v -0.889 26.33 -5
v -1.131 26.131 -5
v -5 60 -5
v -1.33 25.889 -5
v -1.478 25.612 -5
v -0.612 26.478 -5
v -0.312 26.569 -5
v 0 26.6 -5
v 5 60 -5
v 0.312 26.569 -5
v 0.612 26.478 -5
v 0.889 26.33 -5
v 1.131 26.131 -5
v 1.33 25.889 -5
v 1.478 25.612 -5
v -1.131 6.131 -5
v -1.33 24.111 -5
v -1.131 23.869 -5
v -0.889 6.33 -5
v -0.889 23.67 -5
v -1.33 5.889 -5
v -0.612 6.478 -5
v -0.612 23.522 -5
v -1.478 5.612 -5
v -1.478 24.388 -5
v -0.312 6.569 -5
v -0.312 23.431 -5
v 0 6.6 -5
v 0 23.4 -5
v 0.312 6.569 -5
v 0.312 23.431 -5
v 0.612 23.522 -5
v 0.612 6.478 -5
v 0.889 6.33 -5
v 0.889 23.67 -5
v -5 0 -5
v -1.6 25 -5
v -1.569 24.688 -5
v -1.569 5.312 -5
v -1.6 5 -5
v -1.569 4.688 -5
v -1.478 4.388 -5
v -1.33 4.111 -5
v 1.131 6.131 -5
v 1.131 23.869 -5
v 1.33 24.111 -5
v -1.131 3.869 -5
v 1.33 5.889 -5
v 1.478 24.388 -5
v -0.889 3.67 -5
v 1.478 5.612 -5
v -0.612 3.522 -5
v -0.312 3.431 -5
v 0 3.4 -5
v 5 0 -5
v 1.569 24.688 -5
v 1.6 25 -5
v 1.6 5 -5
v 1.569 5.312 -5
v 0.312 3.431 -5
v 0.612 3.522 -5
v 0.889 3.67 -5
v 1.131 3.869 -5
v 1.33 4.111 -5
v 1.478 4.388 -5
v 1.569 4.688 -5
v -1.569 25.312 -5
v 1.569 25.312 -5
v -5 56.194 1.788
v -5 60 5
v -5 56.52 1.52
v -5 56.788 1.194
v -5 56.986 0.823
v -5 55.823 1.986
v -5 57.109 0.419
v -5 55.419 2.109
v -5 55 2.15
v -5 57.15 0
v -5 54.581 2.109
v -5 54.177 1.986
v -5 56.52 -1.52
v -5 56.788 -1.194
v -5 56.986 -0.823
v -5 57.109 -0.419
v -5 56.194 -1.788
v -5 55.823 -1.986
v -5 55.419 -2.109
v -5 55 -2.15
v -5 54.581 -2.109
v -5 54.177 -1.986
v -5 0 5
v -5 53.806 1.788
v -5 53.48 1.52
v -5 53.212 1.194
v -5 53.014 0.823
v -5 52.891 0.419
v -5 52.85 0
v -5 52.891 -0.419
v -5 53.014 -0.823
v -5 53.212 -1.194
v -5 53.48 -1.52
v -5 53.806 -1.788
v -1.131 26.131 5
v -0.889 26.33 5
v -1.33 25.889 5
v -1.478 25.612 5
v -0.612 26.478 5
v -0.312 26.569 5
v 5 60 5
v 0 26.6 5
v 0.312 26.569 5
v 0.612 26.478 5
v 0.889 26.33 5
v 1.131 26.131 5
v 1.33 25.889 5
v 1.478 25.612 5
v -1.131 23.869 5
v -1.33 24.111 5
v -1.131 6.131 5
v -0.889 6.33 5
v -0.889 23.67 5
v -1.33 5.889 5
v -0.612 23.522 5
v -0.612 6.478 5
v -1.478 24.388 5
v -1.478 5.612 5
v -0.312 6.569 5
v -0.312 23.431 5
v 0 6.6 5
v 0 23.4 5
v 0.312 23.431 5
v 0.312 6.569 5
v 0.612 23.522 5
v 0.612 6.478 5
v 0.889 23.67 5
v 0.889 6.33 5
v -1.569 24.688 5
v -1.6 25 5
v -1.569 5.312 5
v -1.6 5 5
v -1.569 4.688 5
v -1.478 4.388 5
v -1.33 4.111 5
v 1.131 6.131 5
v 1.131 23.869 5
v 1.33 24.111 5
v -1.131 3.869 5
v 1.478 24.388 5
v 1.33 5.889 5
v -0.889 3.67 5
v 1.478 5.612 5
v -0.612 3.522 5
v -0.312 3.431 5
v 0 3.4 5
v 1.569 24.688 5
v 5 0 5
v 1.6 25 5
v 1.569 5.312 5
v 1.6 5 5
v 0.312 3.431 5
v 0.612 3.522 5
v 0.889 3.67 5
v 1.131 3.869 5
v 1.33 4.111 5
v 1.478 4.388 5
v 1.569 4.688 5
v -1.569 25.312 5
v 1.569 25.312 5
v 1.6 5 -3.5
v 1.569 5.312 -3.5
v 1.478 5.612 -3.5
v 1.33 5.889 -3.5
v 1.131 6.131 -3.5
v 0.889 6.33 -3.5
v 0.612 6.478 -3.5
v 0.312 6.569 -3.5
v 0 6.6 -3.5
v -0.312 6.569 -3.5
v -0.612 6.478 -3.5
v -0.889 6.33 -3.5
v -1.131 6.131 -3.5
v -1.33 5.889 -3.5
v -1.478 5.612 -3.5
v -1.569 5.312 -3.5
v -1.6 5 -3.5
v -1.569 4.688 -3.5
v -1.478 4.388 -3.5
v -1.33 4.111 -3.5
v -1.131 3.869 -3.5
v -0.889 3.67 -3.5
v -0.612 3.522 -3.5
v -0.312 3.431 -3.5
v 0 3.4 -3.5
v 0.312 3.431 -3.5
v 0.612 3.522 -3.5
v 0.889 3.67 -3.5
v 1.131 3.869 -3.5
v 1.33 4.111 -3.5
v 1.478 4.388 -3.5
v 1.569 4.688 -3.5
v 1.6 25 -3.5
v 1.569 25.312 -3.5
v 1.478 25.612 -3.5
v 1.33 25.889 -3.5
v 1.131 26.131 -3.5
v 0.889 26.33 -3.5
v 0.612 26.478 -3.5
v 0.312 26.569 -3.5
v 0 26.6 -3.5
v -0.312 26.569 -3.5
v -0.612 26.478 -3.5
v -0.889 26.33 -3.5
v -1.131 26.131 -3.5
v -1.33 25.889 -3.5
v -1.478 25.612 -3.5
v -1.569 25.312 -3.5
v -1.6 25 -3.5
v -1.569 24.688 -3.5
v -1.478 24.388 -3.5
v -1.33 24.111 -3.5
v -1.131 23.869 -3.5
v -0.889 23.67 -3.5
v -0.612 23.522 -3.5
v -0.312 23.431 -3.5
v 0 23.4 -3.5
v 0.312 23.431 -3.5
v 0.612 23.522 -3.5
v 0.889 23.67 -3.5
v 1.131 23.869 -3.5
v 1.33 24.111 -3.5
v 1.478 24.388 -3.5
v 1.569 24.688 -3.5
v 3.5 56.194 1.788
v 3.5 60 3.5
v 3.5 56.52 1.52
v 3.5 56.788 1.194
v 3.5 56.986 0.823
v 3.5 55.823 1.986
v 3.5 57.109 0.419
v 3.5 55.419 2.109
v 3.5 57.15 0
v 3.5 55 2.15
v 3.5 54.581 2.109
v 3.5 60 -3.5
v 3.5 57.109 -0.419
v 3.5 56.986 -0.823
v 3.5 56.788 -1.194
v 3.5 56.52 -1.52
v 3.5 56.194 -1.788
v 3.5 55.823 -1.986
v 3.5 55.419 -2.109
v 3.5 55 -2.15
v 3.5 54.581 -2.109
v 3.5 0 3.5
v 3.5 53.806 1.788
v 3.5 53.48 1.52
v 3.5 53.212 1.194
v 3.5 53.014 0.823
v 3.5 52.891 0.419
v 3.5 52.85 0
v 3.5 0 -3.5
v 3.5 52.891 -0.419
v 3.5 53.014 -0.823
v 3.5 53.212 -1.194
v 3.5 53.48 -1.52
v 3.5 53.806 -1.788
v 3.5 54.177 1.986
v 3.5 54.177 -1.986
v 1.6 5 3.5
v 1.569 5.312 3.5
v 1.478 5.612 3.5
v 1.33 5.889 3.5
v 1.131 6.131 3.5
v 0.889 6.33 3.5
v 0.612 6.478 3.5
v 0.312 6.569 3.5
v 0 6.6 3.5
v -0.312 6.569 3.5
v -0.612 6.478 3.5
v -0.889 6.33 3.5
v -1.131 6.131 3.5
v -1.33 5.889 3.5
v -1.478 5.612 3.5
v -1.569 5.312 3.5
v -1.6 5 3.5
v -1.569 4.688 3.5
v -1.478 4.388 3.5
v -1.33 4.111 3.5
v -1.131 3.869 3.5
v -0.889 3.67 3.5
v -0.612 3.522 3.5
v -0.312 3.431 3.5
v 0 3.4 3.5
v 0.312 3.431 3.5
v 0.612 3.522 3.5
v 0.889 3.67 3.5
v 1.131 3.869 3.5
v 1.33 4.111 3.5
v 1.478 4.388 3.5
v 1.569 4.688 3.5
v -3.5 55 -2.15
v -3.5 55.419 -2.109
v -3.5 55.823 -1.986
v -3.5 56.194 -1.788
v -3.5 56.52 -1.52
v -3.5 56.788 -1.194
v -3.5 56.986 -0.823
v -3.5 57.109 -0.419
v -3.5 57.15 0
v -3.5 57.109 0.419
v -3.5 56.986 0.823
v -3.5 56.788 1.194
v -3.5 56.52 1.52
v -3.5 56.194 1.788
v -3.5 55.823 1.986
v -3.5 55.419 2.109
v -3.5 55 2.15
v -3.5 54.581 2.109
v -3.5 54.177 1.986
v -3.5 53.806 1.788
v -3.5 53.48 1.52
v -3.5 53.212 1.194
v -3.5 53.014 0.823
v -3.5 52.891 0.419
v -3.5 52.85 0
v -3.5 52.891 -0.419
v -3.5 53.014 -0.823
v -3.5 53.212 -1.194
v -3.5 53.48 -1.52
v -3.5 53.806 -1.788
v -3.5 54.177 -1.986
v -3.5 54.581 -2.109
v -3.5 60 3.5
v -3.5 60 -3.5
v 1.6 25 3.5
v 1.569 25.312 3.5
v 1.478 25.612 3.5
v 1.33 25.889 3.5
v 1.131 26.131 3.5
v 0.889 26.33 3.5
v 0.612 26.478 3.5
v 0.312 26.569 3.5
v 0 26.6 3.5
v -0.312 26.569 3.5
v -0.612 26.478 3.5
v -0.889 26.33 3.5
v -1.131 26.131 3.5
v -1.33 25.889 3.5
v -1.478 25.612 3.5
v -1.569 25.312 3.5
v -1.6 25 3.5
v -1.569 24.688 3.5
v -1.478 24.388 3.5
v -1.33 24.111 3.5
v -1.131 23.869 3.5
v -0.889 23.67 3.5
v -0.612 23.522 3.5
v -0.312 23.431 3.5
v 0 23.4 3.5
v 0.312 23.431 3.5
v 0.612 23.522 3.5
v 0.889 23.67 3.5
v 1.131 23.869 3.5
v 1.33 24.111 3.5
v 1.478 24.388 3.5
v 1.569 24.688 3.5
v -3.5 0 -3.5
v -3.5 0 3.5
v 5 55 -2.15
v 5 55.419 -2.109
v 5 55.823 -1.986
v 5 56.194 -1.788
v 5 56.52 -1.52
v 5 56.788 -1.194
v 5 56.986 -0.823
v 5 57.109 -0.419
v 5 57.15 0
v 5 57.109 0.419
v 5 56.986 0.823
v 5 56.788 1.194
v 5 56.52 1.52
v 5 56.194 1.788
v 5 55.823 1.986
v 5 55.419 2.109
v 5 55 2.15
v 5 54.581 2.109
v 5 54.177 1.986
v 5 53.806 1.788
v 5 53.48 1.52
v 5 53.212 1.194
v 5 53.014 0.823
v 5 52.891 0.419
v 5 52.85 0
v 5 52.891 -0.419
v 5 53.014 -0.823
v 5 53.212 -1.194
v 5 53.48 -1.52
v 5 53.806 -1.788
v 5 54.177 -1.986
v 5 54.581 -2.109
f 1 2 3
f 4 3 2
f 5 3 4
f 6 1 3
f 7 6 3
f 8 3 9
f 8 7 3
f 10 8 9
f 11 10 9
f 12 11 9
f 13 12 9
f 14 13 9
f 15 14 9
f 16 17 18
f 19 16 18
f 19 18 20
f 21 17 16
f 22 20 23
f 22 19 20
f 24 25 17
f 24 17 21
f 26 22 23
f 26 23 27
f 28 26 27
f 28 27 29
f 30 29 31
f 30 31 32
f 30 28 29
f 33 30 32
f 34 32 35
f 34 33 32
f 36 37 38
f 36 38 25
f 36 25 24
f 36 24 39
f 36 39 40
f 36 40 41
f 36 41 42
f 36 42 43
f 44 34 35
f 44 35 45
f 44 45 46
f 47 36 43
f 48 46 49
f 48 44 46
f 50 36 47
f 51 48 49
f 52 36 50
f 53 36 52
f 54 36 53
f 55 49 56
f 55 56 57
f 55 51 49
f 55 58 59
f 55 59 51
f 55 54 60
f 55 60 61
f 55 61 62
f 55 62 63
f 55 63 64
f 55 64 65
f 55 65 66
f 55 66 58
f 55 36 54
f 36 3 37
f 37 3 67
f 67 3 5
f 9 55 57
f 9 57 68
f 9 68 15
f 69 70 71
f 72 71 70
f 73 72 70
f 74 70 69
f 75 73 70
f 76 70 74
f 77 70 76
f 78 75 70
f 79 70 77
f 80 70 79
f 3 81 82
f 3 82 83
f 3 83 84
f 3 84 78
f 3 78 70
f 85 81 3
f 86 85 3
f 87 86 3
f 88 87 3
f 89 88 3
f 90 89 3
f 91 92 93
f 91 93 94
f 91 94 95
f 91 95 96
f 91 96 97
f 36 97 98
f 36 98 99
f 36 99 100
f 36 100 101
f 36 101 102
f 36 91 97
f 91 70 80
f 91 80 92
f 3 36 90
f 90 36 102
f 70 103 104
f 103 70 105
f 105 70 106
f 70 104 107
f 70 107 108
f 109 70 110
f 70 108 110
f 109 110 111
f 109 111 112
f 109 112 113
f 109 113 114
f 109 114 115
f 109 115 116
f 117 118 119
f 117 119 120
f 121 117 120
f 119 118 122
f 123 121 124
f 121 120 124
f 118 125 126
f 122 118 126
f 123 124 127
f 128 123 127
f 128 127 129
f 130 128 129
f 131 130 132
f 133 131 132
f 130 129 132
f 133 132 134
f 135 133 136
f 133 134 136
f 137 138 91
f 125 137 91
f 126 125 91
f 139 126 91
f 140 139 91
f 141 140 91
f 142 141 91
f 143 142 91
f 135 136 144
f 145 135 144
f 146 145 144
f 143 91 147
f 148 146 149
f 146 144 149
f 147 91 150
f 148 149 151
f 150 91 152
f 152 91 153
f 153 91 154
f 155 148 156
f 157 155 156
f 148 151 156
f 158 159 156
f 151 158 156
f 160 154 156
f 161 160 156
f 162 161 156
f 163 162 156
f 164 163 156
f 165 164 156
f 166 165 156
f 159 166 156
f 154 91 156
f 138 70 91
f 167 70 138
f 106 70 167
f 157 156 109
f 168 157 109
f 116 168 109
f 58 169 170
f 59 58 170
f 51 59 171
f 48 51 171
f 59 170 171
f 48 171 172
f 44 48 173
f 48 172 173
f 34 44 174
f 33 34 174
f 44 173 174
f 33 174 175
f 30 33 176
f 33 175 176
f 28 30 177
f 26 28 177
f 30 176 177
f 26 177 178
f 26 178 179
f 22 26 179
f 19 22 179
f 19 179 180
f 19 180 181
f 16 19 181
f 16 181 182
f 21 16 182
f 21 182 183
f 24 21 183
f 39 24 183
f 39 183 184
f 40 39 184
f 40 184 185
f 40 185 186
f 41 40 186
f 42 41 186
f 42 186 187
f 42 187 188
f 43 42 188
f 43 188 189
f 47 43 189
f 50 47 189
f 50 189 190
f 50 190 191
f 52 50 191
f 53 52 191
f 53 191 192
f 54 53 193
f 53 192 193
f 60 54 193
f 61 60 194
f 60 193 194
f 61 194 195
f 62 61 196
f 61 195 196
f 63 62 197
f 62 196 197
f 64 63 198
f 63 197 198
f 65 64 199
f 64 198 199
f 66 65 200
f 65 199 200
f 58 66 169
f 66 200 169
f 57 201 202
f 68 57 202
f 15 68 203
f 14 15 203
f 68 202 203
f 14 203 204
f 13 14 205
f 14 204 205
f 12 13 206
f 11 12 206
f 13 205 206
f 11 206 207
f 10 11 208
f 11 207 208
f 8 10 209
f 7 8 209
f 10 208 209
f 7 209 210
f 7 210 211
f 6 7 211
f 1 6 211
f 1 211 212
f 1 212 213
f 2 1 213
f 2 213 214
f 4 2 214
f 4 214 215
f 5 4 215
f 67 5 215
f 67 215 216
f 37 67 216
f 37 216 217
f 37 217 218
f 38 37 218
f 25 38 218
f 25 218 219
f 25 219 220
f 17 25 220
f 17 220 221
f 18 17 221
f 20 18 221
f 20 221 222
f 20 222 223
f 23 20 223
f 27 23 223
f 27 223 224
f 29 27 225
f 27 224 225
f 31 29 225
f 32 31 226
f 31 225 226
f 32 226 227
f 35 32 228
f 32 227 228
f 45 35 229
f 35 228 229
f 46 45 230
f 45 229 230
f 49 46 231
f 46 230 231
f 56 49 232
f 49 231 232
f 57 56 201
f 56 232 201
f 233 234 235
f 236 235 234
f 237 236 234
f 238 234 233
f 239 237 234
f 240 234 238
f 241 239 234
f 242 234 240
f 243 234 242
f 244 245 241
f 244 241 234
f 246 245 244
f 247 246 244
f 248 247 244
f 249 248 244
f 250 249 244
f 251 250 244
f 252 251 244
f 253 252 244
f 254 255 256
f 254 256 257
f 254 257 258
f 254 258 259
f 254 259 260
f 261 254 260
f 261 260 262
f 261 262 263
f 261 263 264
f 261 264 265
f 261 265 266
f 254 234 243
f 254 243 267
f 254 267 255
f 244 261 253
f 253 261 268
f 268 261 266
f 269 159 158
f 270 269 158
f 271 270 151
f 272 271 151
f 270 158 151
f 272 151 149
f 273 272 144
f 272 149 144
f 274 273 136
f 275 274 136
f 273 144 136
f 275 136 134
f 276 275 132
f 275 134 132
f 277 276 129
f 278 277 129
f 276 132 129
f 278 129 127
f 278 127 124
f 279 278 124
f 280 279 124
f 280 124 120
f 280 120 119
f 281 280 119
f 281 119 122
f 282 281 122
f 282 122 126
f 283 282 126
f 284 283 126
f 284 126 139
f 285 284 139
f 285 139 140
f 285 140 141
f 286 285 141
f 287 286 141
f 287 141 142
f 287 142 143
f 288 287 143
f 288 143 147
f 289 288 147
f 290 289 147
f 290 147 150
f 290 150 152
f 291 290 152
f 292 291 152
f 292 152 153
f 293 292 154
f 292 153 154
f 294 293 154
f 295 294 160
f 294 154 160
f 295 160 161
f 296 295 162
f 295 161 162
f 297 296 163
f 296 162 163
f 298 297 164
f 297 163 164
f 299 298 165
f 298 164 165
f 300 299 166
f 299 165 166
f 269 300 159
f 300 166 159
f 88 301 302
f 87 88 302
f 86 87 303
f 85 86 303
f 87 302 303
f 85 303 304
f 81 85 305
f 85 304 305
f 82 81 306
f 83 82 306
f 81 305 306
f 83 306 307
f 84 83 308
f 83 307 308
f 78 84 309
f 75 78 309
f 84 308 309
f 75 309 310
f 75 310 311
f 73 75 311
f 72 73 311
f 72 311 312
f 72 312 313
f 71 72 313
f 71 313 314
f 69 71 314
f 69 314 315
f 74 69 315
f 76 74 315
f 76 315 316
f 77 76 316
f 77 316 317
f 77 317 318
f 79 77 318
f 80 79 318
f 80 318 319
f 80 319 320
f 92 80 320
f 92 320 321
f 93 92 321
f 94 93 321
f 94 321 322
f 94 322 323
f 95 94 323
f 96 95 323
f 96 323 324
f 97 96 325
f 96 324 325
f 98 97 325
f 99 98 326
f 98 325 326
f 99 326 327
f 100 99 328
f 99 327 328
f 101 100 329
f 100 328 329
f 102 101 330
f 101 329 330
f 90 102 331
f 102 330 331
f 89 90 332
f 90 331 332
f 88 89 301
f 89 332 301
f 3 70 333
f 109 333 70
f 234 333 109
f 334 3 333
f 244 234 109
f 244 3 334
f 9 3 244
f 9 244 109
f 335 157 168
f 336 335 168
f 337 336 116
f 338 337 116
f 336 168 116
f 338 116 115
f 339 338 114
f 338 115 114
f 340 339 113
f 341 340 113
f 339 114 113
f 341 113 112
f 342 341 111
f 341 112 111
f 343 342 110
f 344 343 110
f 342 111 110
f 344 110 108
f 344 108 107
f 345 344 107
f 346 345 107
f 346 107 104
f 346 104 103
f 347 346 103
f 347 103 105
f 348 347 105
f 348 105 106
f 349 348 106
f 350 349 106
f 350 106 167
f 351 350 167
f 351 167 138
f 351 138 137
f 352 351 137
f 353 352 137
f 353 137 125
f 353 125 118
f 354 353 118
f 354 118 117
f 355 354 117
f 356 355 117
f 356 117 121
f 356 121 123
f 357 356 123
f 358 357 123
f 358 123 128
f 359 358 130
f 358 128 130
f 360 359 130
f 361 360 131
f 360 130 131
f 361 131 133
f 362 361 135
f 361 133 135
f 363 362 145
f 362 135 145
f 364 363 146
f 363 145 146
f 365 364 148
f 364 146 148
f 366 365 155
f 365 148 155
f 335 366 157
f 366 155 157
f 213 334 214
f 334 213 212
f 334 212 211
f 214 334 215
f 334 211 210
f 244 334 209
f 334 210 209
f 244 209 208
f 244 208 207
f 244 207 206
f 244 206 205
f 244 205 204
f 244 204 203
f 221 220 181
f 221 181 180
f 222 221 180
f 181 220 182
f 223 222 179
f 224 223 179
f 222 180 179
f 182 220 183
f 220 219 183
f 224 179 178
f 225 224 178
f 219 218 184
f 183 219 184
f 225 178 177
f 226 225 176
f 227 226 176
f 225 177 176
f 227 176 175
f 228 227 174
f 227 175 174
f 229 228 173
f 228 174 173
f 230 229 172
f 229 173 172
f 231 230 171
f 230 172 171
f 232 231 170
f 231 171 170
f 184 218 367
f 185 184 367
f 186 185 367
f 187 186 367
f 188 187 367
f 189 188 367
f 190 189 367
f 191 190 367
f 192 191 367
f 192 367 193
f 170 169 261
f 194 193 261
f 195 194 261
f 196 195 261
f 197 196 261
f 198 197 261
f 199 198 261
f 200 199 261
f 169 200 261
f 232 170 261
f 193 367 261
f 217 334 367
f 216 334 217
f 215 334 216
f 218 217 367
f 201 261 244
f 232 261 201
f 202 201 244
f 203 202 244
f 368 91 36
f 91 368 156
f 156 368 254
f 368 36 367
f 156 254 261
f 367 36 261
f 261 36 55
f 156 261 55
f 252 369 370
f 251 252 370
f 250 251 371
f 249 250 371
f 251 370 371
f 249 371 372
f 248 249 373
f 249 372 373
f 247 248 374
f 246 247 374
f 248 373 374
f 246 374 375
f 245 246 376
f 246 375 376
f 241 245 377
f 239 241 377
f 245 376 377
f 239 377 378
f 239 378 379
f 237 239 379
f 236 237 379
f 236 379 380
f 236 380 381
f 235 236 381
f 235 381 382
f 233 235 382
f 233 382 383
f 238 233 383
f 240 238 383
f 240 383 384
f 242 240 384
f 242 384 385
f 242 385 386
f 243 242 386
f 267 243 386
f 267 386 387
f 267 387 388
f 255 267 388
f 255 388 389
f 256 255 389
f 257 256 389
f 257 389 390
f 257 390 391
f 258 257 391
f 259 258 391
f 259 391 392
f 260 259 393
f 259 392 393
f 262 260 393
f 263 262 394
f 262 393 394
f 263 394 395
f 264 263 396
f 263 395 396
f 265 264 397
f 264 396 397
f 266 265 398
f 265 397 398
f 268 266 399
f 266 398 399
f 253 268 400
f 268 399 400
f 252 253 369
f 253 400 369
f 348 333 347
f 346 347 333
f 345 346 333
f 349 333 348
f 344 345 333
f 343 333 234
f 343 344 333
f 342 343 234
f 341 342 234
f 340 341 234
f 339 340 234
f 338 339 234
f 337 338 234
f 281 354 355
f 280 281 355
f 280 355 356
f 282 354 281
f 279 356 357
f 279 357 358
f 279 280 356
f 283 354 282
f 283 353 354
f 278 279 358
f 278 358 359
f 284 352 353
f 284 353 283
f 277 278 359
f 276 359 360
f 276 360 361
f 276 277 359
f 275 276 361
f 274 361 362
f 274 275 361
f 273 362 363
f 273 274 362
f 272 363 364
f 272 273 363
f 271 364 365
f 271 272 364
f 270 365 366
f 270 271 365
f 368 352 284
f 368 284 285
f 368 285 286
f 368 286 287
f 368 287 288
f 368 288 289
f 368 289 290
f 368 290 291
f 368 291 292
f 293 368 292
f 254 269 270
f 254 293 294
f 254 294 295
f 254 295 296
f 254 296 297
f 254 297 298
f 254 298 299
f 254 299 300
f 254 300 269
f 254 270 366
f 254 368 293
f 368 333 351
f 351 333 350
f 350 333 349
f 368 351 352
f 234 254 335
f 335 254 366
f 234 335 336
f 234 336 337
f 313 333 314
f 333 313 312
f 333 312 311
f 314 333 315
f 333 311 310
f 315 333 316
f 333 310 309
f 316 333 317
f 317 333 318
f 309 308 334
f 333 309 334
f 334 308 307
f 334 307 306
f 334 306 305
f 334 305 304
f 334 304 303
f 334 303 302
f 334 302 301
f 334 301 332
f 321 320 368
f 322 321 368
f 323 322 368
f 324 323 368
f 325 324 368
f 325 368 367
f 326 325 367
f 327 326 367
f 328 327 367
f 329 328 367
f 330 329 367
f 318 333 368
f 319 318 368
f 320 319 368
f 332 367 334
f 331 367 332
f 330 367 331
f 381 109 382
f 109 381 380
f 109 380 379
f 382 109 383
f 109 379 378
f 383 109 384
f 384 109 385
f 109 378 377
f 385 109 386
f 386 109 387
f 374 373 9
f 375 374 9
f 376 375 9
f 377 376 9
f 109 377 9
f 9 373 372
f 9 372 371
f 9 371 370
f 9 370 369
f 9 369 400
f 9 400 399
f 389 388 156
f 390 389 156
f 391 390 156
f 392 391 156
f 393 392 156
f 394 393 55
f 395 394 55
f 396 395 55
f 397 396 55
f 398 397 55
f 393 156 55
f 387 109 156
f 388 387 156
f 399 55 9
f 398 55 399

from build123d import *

# Parameters (mm, degrees)
SKETCH_1_W          = 10
SKETCH_1_H          = 10
SKETCH_1_W_2        = 7
SKETCH_1_H_2        = 7
EXTRUDE_1_DEPTH     = 60
SKETCH_2_R          = 1.6
CUT_EXTRUDE_1_DEPTH = 62.032778079
SKETCH_3_R          = 2.15
CUT_EXTRUDE_2_DEPTH = 62.032778079


with BuildPart() as part:
    # ｽｹｯﾁ1 → 押し出し-薄板1 (new body)
    with BuildSketch(Plane(origin=(0, 0, 0), x_dir=(1, 0, 0), z_dir=(0, 1, 0))):
        Rectangle(SKETCH_1_W, SKETCH_1_H)
        Rectangle(SKETCH_1_W_2, SKETCH_1_H_2, mode=Mode.SUBTRACT)
    extrude(amount=EXTRUDE_1_DEPTH)

    # ｽｹｯﾁ2 → ｶｯﾄ - 押し出し1 (cut, through all)
    with BuildSketch(Plane.XY.offset(5)):
        with Locations((0, 25)):
            Circle(SKETCH_2_R)
        with Locations((0, 5)):
            Circle(SKETCH_2_R)
    extrude(amount=-CUT_EXTRUDE_1_DEPTH, mode=Mode.SUBTRACT)

    # ｽｹｯﾁ3 → ｶｯﾄ - 押し出し2 (cut, through all)
    with BuildSketch(Plane(origin=(5, 0, 0), x_dir=(0, 0, -1), z_dir=(1, 0, 0))):
        with Locations((0, 55)):
            Circle(SKETCH_3_R)
    extrude(amount=-CUT_EXTRUDE_2_DEPTH, mode=Mode.SUBTRACT)


solid = part.part
